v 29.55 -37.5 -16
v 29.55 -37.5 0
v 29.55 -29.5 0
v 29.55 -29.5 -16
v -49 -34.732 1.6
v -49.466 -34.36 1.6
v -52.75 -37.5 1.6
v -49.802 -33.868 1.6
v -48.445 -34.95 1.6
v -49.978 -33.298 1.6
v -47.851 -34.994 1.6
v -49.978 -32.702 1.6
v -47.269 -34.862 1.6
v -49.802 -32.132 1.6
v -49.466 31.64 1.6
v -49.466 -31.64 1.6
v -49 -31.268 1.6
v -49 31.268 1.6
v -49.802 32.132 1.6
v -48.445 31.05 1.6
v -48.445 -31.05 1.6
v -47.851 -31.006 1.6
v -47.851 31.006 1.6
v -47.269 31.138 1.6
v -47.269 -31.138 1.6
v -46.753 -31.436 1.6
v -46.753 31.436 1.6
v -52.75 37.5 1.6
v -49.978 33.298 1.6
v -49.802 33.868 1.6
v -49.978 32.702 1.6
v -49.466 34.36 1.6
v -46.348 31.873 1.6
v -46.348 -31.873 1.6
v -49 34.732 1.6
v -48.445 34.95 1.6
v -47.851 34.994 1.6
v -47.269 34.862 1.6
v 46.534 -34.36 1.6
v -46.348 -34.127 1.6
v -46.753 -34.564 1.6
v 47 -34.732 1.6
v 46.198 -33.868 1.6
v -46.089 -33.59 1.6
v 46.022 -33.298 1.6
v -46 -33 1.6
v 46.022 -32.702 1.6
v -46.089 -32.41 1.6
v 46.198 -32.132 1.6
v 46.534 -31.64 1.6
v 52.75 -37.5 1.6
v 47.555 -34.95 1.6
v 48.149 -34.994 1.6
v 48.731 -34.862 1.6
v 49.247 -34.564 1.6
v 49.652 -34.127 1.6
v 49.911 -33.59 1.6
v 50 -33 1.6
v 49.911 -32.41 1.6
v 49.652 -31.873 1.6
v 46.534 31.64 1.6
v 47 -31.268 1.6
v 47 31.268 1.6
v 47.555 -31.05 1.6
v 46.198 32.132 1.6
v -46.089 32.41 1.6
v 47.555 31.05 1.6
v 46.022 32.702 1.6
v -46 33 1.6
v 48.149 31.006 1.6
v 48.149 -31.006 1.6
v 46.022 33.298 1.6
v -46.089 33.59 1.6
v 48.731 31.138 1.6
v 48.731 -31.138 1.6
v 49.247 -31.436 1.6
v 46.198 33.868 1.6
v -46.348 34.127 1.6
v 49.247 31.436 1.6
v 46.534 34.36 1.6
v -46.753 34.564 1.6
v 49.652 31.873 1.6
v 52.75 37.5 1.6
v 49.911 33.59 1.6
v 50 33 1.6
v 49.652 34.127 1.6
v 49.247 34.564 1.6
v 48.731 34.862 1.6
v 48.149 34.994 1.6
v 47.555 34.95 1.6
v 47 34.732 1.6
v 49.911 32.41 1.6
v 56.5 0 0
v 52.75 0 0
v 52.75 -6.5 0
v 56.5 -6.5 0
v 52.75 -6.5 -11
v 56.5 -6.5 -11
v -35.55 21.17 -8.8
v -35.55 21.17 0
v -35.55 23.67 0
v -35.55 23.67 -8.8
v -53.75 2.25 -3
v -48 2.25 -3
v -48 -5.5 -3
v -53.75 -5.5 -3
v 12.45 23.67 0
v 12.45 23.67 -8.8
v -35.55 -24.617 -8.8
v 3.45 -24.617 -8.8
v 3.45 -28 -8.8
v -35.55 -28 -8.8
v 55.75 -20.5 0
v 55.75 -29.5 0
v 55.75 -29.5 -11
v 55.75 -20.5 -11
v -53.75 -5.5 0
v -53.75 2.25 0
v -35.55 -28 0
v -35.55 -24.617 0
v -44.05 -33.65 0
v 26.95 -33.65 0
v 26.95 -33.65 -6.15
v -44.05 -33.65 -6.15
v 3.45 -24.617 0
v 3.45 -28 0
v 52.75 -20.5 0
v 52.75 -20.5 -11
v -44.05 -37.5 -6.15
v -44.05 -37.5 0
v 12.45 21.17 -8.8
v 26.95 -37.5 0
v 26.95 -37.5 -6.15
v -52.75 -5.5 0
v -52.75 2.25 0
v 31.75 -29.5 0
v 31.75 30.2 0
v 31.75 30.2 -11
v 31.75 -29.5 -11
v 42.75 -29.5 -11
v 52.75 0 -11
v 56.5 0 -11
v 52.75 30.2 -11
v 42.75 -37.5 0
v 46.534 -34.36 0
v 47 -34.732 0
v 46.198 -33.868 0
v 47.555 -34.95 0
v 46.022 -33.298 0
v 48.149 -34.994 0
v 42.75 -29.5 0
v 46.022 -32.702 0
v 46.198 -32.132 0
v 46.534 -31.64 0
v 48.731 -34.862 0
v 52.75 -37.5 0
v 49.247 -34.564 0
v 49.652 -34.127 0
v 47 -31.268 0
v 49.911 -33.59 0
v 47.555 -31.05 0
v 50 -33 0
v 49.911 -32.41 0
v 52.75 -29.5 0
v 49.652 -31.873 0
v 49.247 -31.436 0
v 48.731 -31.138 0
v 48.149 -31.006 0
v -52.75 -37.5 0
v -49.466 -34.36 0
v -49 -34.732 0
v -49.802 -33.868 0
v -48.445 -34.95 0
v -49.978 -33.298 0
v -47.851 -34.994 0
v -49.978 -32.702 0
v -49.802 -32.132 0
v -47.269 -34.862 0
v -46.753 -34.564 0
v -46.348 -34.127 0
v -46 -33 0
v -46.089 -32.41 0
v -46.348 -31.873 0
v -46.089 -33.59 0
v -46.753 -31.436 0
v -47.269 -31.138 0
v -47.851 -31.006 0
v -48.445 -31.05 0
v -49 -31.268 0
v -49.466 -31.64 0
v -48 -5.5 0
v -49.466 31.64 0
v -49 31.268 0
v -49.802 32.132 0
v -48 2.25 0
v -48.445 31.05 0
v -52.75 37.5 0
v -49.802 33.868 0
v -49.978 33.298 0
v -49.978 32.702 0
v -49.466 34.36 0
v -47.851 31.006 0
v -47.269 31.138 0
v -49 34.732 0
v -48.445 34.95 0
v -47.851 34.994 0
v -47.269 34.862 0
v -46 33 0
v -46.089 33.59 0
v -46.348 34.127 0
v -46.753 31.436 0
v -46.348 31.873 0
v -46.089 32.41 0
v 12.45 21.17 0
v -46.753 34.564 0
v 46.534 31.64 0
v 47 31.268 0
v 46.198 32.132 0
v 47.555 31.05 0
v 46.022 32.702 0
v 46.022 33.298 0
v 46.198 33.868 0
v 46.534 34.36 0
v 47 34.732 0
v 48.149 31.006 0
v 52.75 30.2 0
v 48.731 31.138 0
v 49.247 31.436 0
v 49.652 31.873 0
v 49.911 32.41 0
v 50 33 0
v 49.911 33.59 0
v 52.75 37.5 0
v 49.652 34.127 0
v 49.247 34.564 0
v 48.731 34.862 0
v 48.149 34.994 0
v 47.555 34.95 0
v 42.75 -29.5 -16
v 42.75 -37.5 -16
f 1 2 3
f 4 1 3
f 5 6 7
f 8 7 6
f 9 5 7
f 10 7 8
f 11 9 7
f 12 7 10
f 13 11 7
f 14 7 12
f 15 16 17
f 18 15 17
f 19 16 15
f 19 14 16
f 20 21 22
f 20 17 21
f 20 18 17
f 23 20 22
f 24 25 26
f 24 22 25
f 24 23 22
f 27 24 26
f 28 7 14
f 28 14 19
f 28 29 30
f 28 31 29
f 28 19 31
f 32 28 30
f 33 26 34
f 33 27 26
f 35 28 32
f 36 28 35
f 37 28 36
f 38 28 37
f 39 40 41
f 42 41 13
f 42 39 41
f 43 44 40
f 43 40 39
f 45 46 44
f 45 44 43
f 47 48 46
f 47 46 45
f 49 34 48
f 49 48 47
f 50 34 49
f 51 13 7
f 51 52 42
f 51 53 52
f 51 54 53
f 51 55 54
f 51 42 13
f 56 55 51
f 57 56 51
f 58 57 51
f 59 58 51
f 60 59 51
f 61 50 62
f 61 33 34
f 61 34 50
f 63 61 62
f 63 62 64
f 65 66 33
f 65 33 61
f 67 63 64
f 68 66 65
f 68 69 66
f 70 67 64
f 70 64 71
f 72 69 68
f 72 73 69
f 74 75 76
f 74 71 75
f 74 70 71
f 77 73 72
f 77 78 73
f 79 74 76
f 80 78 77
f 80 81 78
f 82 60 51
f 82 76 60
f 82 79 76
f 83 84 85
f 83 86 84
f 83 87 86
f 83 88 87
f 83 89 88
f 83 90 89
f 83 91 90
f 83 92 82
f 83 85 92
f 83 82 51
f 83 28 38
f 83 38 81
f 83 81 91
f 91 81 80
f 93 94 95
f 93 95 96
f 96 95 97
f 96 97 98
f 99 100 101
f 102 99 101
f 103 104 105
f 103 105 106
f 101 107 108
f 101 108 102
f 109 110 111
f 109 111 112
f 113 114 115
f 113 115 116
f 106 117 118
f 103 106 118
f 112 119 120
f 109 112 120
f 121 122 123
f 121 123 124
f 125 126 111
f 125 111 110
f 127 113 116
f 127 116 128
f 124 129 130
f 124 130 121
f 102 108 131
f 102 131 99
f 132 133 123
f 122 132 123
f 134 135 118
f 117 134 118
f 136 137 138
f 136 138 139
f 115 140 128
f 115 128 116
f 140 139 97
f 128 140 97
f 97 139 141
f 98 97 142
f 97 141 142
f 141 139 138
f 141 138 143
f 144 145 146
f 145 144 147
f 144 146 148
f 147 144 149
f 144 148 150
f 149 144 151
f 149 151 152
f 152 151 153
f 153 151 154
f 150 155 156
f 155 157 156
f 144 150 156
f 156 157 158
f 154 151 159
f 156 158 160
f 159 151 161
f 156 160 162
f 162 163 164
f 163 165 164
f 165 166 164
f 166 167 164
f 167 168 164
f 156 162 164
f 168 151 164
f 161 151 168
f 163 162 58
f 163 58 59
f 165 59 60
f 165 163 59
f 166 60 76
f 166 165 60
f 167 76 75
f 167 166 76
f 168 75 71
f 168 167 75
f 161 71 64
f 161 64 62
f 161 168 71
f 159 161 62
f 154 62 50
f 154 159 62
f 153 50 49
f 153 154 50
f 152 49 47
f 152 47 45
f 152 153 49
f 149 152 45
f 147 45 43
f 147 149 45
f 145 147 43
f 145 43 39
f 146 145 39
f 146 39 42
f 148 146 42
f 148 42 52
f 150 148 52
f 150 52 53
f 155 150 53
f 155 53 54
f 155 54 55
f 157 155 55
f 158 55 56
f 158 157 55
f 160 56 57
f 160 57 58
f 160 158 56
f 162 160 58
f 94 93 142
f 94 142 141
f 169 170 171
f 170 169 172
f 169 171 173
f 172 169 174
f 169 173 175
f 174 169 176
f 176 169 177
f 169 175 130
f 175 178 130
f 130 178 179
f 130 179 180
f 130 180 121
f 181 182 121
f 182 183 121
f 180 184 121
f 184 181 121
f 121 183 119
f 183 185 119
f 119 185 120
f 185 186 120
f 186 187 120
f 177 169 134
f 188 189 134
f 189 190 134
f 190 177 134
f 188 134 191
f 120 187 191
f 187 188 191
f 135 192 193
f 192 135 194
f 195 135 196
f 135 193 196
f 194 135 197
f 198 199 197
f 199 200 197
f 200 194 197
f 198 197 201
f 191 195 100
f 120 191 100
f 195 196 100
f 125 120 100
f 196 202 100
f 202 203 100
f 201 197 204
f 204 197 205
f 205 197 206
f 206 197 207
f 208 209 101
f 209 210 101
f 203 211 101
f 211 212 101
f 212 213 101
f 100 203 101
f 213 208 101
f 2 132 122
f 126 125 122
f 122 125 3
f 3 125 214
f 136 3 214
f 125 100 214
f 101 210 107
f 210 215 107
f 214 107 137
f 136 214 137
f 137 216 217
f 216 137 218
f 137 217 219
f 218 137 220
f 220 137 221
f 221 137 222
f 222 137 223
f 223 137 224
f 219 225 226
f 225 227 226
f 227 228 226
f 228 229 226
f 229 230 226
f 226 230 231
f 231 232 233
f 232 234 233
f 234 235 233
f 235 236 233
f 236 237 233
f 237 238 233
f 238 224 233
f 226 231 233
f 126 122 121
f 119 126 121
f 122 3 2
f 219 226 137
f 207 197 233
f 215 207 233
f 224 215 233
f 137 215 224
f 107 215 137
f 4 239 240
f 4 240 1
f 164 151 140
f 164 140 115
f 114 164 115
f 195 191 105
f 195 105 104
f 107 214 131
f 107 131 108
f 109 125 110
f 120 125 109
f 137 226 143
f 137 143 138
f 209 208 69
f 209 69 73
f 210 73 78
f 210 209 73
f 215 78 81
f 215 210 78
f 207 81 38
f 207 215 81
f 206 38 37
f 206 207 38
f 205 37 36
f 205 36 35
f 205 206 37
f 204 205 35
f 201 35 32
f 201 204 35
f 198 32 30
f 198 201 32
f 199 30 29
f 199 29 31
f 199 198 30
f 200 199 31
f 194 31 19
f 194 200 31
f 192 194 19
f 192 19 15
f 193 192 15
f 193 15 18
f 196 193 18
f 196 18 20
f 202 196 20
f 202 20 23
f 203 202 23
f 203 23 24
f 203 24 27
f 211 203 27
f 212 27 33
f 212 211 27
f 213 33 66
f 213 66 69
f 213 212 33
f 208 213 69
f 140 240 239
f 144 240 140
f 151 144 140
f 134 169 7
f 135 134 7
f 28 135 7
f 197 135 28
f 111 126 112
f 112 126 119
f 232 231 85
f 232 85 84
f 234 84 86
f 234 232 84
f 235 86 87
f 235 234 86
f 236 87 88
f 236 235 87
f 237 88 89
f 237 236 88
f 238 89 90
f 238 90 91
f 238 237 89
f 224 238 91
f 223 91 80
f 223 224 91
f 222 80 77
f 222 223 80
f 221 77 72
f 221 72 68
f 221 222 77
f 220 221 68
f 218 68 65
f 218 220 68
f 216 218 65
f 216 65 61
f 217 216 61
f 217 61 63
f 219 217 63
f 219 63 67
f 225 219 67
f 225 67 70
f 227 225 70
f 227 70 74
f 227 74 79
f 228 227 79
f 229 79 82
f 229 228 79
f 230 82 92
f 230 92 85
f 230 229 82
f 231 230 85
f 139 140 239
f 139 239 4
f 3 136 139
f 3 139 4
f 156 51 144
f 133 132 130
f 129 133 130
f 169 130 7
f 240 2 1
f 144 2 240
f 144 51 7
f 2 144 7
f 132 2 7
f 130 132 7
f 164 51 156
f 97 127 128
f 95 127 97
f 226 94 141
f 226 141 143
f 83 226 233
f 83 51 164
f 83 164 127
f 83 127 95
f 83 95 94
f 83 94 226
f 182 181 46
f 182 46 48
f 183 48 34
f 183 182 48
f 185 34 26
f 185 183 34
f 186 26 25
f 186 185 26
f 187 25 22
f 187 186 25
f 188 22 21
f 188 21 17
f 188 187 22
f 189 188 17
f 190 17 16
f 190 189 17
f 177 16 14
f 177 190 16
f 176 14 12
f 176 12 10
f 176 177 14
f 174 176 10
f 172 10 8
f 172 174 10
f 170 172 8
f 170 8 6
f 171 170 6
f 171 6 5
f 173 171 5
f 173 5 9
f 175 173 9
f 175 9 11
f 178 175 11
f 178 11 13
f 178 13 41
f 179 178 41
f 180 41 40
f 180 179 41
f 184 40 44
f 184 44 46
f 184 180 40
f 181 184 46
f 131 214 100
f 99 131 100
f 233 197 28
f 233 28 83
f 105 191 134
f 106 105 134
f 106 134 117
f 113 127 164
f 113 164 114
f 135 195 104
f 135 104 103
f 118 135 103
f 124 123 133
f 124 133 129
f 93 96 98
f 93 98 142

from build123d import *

# Parameters (mm, degrees)
ESQUISSE1_W        = 105.5
ESQUISSE1_H        = 75
ESQUISSE1_R        = 2
BOSS_EXTRU_1_DEPTH = 1.6
BOSS_EXTRU_2_DEPTH = 11
ESQUISSE6_W        = 13.2
ESQUISSE6_H        = 8
BOSS_EXTRU_3_DEPTH = 16
ESQUISSE7_W        = 71
ESQUISSE7_H        = 3.85
BOSS_EXTRU_4_DEPTH = 6.15
ESQUISSE8_W        = 48
ESQUISSE8_H        = 2.5
ESQUISSE8_W_2      = 39
ESQUISSE8_H_2      = 3.38327079
BOSS_EXTRU_5_DEPTH = 8.8
ESQUISSE9_W        = 5.75
ESQUISSE9_H        = 7.75
BOSS_EXTRU_6_DEPTH = 3


with BuildPart() as part:
    # Esquisse1 → Boss.-Extru.1 (new body)
    with BuildSketch(Plane.XY):
        Rectangle(ESQUISSE1_W, ESQUISSE1_H)
        with Locations((-48, 33)):
            Circle(ESQUISSE1_R, mode=Mode.SUBTRACT)
        with Locations((48, 33)):
            Circle(ESQUISSE1_R, mode=Mode.SUBTRACT)
        with Locations((-48, -33)):
            Circle(ESQUISSE1_R, mode=Mode.SUBTRACT)
        with Locations((48, -33)):
            Circle(ESQUISSE1_R, mode=Mode.SUBTRACT)
    extrude(amount=BOSS_EXTRU_1_DEPTH)

    # Esquisse5 → Boss.-Extru.2 (add)
    with BuildSketch(Plane(origin=(0, 0, 0), x_dir=(-1, 0, 0), z_dir=(0, 0, -1))):
        Polygon((-52.75, 30.2), (-31.75, 30.2), (-31.75, -29.5), (-55.75, -29.5), (-55.75, -20.5), (-52.75, -20.5), (-52.75, -6.5), (-56.5, -6.5), (-56.5, 0), (-52.75, 0), align=None)
    extrude(amount=BOSS_EXTRU_2_DEPTH)

    # Esquisse6 → Boss.-Extru.3 (add)
    with BuildSketch(Plane(origin=(0, 0, 0), x_dir=(-1, 0, 0), z_dir=(0, 0, -1))):
        with Locations((-36.15, -33.5)):
            Rectangle(ESQUISSE6_W, ESQUISSE6_H)
    extrude(amount=BOSS_EXTRU_3_DEPTH)

    # Esquisse7 → Boss.-Extru.4 (add)
    with BuildSketch(Plane(origin=(0, 0, 0), x_dir=(-1, 0, 0), z_dir=(0, 0, -1))):
        with Locations((8.55, -35.575)):
            Rectangle(ESQUISSE7_W, ESQUISSE7_H)
    extrude(amount=BOSS_EXTRU_4_DEPTH)

    # Esquisse8 → Boss.-Extru.5 (add)
    with BuildSketch(Plane(origin=(0, 0, 0), x_dir=(-1, 0, 0), z_dir=(0, 0, -1))):
        with Locations((11.55, 22.42)):
            Rectangle(ESQUISSE8_W, ESQUISSE8_H)
        with Locations((16.05, -26.308364605)):
            Rectangle(ESQUISSE8_W_2, ESQUISSE8_H_2)
    extrude(amount=BOSS_EXTRU_5_DEPTH)

    # Esquisse9 → Boss.-Extru.6 (add)
    with BuildSketch(Plane(origin=(0, 0, 0), x_dir=(-1, 0, 0), z_dir=(0, 0, -1))):
        with Locations((50.875, -1.625)):
            Rectangle(ESQUISSE9_W, ESQUISSE9_H)
    extrude(amount=BOSS_EXTRU_6_DEPTH)


solid = part.part
